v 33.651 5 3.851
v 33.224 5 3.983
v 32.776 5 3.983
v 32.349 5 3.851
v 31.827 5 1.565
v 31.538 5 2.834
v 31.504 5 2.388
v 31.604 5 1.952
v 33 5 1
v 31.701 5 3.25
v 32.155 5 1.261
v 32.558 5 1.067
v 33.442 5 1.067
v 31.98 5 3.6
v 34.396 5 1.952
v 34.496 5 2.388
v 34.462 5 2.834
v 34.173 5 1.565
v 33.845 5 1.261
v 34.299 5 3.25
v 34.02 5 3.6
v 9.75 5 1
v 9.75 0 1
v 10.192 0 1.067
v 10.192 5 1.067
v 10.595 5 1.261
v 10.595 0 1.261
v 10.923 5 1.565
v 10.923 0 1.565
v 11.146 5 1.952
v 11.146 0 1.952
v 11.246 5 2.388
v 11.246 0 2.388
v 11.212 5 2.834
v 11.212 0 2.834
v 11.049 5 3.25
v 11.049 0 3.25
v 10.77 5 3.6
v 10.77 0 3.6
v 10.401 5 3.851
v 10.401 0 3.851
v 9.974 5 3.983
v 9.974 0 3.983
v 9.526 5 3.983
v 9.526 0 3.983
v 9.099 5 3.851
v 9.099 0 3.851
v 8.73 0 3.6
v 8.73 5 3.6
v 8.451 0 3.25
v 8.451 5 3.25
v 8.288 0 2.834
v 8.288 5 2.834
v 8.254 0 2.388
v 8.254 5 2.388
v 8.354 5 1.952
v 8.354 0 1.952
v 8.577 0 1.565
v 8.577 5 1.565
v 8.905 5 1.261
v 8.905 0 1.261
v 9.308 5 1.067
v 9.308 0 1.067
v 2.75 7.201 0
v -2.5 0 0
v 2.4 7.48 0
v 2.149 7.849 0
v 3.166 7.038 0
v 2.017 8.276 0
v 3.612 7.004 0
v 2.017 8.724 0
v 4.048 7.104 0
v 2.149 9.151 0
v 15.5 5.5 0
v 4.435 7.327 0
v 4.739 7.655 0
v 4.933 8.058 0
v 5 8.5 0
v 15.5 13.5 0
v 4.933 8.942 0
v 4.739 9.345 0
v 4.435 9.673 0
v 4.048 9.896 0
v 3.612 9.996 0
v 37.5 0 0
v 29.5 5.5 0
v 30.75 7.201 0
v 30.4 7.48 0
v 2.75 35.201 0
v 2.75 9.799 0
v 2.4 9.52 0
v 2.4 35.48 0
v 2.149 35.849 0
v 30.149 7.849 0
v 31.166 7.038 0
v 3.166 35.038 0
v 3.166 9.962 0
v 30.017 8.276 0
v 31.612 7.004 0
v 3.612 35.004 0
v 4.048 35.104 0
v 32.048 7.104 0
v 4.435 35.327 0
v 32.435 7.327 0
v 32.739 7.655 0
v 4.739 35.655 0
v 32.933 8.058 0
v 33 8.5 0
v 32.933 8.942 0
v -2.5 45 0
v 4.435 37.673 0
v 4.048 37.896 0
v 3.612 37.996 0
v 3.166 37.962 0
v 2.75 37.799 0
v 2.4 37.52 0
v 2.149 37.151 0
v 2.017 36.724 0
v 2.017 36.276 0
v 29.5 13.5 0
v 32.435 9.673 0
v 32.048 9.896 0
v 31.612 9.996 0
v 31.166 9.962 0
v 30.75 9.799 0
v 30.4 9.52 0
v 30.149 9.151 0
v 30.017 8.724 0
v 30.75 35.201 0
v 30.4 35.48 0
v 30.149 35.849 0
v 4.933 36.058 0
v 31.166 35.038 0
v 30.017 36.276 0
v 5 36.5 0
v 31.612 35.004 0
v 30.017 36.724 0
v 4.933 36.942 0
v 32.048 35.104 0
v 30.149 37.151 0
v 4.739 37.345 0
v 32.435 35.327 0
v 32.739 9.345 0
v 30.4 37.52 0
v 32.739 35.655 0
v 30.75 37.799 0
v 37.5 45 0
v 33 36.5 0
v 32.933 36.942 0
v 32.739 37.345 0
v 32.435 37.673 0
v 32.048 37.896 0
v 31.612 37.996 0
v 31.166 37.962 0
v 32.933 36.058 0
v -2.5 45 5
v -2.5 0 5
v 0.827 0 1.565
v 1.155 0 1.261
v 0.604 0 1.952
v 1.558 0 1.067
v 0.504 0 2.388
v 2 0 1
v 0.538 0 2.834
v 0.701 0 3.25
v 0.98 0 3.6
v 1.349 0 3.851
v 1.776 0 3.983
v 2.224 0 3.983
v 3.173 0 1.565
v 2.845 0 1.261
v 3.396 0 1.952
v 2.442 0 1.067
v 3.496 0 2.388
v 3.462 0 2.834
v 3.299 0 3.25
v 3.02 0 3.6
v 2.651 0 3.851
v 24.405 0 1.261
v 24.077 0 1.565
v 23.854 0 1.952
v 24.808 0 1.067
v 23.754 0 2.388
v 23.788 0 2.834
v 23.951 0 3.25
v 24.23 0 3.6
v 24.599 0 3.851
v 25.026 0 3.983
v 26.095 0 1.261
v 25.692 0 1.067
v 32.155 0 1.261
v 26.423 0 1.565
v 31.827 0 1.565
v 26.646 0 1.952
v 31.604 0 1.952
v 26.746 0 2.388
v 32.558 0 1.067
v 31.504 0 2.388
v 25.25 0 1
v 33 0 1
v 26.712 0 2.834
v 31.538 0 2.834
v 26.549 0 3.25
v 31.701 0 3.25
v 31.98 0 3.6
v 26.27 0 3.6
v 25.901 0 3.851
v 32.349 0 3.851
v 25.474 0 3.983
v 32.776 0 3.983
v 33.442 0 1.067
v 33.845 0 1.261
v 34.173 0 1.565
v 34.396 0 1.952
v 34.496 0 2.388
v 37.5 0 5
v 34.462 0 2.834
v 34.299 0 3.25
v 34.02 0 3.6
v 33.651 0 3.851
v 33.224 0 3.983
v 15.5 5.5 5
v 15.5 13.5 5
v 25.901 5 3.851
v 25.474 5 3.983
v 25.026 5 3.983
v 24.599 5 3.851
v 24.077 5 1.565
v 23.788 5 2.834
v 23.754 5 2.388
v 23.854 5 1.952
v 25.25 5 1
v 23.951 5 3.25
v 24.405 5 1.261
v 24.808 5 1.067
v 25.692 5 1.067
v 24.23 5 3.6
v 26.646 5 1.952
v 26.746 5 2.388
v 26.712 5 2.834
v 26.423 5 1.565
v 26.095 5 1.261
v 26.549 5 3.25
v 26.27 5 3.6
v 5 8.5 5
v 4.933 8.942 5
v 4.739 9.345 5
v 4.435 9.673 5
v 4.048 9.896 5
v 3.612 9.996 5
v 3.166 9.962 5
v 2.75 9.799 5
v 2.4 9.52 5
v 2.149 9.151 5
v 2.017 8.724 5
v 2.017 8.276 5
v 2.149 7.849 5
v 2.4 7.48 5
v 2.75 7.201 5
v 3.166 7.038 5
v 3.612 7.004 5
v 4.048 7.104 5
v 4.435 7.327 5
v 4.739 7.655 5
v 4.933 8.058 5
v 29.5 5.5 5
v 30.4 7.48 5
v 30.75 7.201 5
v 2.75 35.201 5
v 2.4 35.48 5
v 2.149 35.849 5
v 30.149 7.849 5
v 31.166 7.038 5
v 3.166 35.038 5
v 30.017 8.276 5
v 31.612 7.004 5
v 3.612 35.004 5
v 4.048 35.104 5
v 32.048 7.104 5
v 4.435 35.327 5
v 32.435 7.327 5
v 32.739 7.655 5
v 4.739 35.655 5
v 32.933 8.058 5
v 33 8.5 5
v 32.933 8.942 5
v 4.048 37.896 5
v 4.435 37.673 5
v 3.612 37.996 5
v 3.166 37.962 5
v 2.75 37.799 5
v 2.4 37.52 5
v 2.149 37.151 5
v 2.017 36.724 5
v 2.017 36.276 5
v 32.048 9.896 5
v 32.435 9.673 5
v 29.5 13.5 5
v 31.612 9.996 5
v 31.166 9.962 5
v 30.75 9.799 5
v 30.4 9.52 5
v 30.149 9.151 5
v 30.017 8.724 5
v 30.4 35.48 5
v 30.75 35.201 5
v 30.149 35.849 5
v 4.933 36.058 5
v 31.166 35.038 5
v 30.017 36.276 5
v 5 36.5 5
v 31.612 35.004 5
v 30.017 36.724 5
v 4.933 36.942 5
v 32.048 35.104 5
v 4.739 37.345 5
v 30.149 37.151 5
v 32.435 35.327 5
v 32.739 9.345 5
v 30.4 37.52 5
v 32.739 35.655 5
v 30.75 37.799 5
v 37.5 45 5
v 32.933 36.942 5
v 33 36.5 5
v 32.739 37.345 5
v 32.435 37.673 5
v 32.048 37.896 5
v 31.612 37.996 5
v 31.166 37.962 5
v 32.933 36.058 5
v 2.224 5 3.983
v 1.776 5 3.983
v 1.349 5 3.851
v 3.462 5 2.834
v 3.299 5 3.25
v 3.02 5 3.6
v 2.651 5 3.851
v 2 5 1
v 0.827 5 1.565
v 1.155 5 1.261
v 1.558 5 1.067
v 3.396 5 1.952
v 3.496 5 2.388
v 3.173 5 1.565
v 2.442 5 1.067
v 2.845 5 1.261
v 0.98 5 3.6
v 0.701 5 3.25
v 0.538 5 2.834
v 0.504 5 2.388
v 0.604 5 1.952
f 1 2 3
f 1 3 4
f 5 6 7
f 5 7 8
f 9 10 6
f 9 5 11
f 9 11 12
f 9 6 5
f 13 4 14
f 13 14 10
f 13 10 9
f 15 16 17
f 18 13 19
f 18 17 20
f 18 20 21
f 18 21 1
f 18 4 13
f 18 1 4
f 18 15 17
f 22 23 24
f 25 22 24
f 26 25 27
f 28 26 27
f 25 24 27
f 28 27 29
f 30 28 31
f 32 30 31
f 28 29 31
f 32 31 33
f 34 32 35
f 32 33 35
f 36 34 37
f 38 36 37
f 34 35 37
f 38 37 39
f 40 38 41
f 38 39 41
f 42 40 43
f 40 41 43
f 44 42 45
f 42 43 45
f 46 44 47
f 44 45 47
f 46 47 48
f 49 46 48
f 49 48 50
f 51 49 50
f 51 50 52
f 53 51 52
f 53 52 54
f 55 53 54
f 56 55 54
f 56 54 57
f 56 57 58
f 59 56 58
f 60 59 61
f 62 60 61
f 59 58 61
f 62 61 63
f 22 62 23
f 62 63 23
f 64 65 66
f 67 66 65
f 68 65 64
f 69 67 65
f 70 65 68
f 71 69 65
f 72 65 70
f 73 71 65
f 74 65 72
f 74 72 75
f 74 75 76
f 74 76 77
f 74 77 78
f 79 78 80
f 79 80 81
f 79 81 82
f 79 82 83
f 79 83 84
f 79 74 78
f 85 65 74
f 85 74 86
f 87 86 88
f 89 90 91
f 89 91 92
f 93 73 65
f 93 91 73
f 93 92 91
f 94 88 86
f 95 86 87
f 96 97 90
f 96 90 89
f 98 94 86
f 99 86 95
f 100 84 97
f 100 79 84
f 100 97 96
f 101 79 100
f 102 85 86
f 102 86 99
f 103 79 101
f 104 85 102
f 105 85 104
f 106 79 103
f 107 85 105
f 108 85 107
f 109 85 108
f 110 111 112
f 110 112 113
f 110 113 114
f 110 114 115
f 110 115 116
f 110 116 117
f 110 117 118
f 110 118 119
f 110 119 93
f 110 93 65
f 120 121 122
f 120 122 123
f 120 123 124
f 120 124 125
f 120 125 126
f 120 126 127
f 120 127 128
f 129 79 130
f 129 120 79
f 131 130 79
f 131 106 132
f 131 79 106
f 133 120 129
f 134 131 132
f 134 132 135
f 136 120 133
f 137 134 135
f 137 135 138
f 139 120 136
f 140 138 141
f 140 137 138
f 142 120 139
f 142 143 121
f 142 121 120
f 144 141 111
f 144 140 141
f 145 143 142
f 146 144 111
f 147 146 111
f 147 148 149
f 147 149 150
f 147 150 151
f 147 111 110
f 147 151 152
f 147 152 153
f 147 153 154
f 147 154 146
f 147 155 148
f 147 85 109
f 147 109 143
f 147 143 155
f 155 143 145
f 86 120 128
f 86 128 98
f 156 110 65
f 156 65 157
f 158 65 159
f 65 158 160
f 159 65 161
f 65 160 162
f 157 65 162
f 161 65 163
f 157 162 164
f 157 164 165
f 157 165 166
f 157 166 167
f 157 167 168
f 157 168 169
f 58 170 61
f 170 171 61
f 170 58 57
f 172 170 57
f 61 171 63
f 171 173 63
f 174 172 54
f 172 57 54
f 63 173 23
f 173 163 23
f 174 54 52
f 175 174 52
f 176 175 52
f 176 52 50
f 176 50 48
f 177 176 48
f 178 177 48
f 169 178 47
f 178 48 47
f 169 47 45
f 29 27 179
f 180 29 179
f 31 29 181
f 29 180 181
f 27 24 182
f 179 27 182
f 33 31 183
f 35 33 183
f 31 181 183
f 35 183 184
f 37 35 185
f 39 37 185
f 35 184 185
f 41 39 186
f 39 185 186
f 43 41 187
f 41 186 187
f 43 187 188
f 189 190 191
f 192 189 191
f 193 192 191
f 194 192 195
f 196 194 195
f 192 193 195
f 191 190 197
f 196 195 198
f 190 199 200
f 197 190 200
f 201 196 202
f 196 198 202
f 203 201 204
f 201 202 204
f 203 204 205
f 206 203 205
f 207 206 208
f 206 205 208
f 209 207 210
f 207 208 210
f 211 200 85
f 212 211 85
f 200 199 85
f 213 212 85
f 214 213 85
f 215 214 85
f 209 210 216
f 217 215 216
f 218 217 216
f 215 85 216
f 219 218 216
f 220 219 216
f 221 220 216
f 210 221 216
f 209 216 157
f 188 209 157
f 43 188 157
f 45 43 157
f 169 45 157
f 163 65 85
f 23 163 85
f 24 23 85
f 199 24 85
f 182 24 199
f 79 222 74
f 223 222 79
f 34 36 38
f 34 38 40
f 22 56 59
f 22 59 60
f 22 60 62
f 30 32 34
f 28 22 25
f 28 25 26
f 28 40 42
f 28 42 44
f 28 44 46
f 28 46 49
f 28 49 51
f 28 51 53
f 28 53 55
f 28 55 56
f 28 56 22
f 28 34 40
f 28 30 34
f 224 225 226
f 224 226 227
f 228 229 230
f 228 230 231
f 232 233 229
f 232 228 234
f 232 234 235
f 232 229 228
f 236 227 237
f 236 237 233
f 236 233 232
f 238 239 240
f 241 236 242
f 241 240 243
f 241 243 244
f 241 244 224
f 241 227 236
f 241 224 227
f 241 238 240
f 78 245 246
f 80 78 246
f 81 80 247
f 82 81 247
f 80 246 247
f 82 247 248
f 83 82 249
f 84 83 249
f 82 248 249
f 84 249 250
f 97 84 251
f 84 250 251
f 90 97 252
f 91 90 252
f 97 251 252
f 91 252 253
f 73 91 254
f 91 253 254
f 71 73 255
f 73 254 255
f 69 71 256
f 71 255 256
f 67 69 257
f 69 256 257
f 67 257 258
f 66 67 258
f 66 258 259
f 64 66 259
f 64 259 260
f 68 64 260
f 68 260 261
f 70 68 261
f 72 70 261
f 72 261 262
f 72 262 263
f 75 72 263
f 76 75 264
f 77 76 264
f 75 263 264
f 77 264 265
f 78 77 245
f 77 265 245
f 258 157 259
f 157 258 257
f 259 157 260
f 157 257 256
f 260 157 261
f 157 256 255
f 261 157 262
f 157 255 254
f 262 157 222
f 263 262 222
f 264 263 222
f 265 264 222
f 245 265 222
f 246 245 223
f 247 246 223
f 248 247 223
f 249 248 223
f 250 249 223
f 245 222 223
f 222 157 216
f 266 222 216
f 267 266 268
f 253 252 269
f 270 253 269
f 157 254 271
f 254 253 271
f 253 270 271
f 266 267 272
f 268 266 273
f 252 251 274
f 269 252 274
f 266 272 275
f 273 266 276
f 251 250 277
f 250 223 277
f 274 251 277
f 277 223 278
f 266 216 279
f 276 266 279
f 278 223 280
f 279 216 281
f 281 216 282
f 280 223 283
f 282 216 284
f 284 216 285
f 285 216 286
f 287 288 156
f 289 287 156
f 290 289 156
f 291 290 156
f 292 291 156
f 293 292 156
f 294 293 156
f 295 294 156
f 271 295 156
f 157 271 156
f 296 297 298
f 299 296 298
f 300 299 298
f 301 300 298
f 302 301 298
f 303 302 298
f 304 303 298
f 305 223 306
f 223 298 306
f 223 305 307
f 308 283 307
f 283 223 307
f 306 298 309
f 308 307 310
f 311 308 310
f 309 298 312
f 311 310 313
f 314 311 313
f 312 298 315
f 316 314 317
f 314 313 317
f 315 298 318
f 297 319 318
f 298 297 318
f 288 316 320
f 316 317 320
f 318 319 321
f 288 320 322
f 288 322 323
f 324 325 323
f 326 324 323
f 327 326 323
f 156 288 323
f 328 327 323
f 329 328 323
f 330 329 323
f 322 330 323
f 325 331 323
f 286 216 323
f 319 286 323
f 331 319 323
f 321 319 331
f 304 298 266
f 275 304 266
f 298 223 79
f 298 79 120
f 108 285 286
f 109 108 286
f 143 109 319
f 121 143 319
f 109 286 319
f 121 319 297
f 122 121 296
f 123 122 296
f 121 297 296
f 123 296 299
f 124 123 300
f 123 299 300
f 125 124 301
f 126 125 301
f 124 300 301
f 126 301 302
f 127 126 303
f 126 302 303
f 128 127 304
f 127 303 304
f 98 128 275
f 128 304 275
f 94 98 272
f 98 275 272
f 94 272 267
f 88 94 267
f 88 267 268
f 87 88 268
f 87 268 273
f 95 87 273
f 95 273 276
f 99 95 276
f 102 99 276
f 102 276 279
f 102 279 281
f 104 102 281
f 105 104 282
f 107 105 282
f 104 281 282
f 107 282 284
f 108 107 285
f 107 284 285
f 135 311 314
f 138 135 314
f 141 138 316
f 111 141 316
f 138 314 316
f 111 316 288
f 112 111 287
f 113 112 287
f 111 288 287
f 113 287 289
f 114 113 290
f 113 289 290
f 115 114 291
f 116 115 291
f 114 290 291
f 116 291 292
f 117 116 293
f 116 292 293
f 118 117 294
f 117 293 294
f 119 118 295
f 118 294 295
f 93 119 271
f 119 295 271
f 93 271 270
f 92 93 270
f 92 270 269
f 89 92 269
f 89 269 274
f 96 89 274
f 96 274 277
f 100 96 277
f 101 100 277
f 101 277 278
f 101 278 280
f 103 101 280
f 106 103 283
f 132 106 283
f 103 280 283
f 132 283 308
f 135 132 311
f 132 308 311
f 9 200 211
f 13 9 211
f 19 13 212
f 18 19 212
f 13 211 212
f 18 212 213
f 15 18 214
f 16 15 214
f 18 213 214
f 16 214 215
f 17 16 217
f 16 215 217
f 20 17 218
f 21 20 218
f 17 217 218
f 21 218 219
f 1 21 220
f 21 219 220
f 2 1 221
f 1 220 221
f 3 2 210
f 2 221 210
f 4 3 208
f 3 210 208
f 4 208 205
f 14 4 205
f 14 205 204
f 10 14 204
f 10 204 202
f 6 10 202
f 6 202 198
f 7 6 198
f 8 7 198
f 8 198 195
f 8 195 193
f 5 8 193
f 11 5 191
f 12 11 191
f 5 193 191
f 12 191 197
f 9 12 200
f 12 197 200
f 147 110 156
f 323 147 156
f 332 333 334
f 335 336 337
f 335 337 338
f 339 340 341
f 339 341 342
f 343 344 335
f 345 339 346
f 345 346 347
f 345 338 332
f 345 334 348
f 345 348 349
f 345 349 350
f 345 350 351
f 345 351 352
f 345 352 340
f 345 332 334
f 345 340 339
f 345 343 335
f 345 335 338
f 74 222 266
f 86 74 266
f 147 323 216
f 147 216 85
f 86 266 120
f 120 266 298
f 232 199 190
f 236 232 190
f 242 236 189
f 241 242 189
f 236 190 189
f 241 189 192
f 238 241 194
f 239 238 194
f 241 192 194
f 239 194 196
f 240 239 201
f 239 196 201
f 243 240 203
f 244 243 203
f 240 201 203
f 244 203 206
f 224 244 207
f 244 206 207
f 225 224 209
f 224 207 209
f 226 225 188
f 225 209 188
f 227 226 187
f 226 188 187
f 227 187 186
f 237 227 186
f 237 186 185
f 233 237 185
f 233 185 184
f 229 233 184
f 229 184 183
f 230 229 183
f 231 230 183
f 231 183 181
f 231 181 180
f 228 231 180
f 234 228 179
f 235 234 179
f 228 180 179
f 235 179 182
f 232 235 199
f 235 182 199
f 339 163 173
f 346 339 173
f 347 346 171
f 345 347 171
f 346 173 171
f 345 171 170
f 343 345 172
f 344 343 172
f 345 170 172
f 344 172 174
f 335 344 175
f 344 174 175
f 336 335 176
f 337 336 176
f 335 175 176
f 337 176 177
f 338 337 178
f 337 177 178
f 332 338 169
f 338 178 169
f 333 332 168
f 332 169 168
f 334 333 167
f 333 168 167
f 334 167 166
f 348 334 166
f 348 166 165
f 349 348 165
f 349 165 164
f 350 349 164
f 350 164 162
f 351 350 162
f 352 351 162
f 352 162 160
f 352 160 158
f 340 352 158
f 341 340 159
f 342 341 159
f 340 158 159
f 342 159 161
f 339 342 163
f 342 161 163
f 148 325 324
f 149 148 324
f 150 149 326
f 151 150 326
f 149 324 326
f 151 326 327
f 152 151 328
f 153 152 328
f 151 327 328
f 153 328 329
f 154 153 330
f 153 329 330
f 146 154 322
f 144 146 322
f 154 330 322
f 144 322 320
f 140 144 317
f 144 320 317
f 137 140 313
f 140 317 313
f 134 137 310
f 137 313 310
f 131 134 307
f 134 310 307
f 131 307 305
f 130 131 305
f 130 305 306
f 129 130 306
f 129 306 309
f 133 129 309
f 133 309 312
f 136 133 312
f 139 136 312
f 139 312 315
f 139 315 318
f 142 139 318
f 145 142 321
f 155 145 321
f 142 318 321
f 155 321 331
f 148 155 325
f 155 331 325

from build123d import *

# Parameters (mm, degrees)
SKETCH1_W           = 35
SKETCH1_H           = 45
BOSS_EXTRUDE1_DEPTH = 5
SKETCH2_R           = 1.5
CUT_EXTRUDE1_DEPTH  = 5
SKETCH4_W           = 5
SKETCH4_H           = 45
BOSS_EXTRUDE2_DEPTH = 2.5
SKETCH5_W           = 5
SKETCH5_H           = 45
BOSS_EXTRUDE3_DEPTH = 2.5
SKETCH6_R           = 1.5
CUT_EXTRUDE2_DEPTH  = 5
SKETCH7_W           = 14
SKETCH7_H           = 8
CUT_EXTRUDE3_DEPTH  = 5


with BuildPart() as part:
    # Sketch1 → Boss-Extrude1 (new body)
    with BuildSketch(Plane.XY):
        with Locations((17.5, 22.5)):
            Rectangle(SKETCH1_W, SKETCH1_H)
    extrude(amount=BOSS_EXTRUDE1_DEPTH)

    # Sketch2 → Cut-Extrude1 (cut)
    with BuildSketch(Plane.XZ):
        with Locations(Location((2, 2.5, 0), (0, 0, 270))):
            Circle(SKETCH2_R)
        with Locations(Location((33, 2.5, 0), (0, 0, 270))):
            Circle(SKETCH2_R)
        with Locations(Location((9.75, 2.5, 0), (0, 0, 270))):
            Circle(SKETCH2_R)
        with Locations(Location((25.25, 2.5, 0), (0, 0, 270))):
            Circle(SKETCH2_R)
    extrude(amount=-CUT_EXTRUDE1_DEPTH, mode=Mode.SUBTRACT)

    # Sketch4 → Boss-Extrude2 (add)
    with BuildSketch(Plane(origin=(35, 0, 0), x_dir=(0, 0, -1), z_dir=(1, 0, 0))):
        with Locations((-2.5, 22.5)):
            Rectangle(SKETCH4_W, SKETCH4_H)
    extrude(amount=BOSS_EXTRUDE2_DEPTH)

    # Sketch5 → Boss-Extrude3 (add)
    with BuildSketch(Plane.ZY):
        with Locations((2.5, 22.5)):
            Rectangle(SKETCH5_W, SKETCH5_H)
    extrude(amount=BOSS_EXTRUDE3_DEPTH)

    # Sketch6 → Cut-Extrude2 (cut)
    with BuildSketch(Plane.XY.offset(5)):
        with Locations((3.5, 36.5)):
            Circle(SKETCH6_R)
        with Locations((31.5, 8.5)):
            Circle(SKETCH6_R)
        with Locations((31.5, 36.5)):
            Circle(SKETCH6_R)
        with Locations((3.5, 8.5)):
            Circle(SKETCH6_R)
    extrude(amount=-CUT_EXTRUDE2_DEPTH, mode=Mode.SUBTRACT)

    # Sketch7 → Cut-Extrude3 (cut)
    with BuildSketch(Plane.XY.offset(5)):
        with Locations((22.5, 9.5)):
            Rectangle(SKETCH7_W, SKETCH7_H)
    extrude(amount=-CUT_EXTRUDE3_DEPTH, mode=Mode.SUBTRACT)


solid = part.part
